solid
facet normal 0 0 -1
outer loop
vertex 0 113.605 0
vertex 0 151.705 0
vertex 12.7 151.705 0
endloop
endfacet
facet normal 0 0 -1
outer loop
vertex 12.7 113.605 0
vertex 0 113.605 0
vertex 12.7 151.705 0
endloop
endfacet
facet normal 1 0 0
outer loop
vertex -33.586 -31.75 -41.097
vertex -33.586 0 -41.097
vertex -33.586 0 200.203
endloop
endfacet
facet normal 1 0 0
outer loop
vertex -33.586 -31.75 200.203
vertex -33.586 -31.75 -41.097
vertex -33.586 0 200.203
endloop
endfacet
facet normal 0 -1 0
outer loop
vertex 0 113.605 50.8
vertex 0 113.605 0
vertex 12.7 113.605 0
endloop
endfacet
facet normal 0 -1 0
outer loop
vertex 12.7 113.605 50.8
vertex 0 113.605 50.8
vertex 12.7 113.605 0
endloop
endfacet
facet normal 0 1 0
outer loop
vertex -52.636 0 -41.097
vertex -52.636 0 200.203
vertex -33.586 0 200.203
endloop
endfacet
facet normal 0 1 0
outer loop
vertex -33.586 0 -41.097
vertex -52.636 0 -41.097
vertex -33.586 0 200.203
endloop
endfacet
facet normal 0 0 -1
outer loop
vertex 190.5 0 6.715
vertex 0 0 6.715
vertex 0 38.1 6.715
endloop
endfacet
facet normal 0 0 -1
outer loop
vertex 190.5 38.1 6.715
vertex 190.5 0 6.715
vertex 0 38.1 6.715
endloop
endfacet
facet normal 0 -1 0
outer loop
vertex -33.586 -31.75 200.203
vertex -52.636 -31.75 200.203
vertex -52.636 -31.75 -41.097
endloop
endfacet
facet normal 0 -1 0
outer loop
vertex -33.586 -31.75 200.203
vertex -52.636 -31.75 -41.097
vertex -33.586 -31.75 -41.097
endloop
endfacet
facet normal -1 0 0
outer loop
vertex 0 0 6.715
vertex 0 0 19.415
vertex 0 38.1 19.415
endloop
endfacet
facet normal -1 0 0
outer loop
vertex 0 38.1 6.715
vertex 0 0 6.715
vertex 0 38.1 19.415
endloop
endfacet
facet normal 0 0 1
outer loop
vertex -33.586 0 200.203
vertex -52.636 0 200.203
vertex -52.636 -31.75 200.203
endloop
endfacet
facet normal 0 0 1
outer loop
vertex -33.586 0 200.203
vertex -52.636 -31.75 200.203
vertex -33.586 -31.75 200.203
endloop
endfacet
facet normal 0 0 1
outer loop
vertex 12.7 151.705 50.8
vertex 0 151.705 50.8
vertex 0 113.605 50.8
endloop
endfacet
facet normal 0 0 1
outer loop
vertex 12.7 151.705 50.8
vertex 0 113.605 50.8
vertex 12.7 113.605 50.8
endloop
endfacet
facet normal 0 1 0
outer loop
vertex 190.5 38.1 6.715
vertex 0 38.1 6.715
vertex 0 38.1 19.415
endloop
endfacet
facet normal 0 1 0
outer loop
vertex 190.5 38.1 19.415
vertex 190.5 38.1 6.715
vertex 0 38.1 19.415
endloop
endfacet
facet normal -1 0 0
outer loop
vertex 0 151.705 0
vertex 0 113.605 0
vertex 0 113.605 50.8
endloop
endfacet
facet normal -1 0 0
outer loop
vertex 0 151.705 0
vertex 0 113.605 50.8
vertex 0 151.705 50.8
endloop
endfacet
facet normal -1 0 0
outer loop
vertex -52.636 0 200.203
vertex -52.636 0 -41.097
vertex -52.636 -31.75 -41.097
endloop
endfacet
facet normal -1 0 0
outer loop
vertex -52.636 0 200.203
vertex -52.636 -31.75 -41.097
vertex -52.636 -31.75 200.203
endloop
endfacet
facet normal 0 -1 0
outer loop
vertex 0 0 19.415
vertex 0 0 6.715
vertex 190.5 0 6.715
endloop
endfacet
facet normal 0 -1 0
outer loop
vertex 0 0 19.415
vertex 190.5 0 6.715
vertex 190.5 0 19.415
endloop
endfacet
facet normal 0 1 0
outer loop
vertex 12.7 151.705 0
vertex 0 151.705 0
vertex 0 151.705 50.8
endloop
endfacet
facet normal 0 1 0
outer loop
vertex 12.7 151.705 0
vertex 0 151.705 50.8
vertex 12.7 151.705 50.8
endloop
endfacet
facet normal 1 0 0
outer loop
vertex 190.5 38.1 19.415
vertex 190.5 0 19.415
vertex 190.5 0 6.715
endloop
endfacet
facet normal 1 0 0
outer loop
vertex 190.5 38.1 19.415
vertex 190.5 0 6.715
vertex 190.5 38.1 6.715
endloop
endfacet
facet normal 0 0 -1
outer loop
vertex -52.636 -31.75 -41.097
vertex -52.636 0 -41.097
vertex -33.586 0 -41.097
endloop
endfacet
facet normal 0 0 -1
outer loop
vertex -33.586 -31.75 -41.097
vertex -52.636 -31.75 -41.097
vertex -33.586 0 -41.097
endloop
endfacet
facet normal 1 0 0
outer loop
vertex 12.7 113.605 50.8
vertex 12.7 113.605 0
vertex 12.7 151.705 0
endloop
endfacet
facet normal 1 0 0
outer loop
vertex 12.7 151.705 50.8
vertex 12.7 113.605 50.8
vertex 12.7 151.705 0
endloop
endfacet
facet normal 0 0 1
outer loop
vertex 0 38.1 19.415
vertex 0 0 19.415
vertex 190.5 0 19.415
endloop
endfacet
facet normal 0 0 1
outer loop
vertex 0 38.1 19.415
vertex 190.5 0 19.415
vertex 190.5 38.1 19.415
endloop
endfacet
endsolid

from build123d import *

# Parameters (mm, degrees)
F0_W     = 19.05
F0_H     = 241.3
F1_DEPTH = 31.75
F2_W     = 38.1
F2_H     = 12.7
F3_DEPTH = 190.5
F4_W     = 12.7
F4_H     = 38.1
F5_DEPTH = 50.8


with BuildPart() as f1:
    # F0 (on Front) → F1 (new body)
    with BuildSketch(Plane.XZ):
        with Locations((-43.111274, 79.552682)):
            Rectangle(F0_W, F0_H)
    extrude(amount=F1_DEPTH)


with BuildPart() as f3:
    # F2 (on Right) → F3 (new body)
    with BuildSketch(Plane.YZ):
        with Locations((19.05, 13.065203)):
            Rectangle(F2_W, F2_H)
    extrude(amount=F3_DEPTH)


with BuildPart() as f5:
    # F4 (on Top) → F5 (new body)
    with BuildSketch(Plane.XY):
        with Locations((6.35, 132.655449)):
            Rectangle(F4_W, F4_H)
    extrude(amount=F5_DEPTH)


solid = Compound([f1.part, f3.part, f5.part])
